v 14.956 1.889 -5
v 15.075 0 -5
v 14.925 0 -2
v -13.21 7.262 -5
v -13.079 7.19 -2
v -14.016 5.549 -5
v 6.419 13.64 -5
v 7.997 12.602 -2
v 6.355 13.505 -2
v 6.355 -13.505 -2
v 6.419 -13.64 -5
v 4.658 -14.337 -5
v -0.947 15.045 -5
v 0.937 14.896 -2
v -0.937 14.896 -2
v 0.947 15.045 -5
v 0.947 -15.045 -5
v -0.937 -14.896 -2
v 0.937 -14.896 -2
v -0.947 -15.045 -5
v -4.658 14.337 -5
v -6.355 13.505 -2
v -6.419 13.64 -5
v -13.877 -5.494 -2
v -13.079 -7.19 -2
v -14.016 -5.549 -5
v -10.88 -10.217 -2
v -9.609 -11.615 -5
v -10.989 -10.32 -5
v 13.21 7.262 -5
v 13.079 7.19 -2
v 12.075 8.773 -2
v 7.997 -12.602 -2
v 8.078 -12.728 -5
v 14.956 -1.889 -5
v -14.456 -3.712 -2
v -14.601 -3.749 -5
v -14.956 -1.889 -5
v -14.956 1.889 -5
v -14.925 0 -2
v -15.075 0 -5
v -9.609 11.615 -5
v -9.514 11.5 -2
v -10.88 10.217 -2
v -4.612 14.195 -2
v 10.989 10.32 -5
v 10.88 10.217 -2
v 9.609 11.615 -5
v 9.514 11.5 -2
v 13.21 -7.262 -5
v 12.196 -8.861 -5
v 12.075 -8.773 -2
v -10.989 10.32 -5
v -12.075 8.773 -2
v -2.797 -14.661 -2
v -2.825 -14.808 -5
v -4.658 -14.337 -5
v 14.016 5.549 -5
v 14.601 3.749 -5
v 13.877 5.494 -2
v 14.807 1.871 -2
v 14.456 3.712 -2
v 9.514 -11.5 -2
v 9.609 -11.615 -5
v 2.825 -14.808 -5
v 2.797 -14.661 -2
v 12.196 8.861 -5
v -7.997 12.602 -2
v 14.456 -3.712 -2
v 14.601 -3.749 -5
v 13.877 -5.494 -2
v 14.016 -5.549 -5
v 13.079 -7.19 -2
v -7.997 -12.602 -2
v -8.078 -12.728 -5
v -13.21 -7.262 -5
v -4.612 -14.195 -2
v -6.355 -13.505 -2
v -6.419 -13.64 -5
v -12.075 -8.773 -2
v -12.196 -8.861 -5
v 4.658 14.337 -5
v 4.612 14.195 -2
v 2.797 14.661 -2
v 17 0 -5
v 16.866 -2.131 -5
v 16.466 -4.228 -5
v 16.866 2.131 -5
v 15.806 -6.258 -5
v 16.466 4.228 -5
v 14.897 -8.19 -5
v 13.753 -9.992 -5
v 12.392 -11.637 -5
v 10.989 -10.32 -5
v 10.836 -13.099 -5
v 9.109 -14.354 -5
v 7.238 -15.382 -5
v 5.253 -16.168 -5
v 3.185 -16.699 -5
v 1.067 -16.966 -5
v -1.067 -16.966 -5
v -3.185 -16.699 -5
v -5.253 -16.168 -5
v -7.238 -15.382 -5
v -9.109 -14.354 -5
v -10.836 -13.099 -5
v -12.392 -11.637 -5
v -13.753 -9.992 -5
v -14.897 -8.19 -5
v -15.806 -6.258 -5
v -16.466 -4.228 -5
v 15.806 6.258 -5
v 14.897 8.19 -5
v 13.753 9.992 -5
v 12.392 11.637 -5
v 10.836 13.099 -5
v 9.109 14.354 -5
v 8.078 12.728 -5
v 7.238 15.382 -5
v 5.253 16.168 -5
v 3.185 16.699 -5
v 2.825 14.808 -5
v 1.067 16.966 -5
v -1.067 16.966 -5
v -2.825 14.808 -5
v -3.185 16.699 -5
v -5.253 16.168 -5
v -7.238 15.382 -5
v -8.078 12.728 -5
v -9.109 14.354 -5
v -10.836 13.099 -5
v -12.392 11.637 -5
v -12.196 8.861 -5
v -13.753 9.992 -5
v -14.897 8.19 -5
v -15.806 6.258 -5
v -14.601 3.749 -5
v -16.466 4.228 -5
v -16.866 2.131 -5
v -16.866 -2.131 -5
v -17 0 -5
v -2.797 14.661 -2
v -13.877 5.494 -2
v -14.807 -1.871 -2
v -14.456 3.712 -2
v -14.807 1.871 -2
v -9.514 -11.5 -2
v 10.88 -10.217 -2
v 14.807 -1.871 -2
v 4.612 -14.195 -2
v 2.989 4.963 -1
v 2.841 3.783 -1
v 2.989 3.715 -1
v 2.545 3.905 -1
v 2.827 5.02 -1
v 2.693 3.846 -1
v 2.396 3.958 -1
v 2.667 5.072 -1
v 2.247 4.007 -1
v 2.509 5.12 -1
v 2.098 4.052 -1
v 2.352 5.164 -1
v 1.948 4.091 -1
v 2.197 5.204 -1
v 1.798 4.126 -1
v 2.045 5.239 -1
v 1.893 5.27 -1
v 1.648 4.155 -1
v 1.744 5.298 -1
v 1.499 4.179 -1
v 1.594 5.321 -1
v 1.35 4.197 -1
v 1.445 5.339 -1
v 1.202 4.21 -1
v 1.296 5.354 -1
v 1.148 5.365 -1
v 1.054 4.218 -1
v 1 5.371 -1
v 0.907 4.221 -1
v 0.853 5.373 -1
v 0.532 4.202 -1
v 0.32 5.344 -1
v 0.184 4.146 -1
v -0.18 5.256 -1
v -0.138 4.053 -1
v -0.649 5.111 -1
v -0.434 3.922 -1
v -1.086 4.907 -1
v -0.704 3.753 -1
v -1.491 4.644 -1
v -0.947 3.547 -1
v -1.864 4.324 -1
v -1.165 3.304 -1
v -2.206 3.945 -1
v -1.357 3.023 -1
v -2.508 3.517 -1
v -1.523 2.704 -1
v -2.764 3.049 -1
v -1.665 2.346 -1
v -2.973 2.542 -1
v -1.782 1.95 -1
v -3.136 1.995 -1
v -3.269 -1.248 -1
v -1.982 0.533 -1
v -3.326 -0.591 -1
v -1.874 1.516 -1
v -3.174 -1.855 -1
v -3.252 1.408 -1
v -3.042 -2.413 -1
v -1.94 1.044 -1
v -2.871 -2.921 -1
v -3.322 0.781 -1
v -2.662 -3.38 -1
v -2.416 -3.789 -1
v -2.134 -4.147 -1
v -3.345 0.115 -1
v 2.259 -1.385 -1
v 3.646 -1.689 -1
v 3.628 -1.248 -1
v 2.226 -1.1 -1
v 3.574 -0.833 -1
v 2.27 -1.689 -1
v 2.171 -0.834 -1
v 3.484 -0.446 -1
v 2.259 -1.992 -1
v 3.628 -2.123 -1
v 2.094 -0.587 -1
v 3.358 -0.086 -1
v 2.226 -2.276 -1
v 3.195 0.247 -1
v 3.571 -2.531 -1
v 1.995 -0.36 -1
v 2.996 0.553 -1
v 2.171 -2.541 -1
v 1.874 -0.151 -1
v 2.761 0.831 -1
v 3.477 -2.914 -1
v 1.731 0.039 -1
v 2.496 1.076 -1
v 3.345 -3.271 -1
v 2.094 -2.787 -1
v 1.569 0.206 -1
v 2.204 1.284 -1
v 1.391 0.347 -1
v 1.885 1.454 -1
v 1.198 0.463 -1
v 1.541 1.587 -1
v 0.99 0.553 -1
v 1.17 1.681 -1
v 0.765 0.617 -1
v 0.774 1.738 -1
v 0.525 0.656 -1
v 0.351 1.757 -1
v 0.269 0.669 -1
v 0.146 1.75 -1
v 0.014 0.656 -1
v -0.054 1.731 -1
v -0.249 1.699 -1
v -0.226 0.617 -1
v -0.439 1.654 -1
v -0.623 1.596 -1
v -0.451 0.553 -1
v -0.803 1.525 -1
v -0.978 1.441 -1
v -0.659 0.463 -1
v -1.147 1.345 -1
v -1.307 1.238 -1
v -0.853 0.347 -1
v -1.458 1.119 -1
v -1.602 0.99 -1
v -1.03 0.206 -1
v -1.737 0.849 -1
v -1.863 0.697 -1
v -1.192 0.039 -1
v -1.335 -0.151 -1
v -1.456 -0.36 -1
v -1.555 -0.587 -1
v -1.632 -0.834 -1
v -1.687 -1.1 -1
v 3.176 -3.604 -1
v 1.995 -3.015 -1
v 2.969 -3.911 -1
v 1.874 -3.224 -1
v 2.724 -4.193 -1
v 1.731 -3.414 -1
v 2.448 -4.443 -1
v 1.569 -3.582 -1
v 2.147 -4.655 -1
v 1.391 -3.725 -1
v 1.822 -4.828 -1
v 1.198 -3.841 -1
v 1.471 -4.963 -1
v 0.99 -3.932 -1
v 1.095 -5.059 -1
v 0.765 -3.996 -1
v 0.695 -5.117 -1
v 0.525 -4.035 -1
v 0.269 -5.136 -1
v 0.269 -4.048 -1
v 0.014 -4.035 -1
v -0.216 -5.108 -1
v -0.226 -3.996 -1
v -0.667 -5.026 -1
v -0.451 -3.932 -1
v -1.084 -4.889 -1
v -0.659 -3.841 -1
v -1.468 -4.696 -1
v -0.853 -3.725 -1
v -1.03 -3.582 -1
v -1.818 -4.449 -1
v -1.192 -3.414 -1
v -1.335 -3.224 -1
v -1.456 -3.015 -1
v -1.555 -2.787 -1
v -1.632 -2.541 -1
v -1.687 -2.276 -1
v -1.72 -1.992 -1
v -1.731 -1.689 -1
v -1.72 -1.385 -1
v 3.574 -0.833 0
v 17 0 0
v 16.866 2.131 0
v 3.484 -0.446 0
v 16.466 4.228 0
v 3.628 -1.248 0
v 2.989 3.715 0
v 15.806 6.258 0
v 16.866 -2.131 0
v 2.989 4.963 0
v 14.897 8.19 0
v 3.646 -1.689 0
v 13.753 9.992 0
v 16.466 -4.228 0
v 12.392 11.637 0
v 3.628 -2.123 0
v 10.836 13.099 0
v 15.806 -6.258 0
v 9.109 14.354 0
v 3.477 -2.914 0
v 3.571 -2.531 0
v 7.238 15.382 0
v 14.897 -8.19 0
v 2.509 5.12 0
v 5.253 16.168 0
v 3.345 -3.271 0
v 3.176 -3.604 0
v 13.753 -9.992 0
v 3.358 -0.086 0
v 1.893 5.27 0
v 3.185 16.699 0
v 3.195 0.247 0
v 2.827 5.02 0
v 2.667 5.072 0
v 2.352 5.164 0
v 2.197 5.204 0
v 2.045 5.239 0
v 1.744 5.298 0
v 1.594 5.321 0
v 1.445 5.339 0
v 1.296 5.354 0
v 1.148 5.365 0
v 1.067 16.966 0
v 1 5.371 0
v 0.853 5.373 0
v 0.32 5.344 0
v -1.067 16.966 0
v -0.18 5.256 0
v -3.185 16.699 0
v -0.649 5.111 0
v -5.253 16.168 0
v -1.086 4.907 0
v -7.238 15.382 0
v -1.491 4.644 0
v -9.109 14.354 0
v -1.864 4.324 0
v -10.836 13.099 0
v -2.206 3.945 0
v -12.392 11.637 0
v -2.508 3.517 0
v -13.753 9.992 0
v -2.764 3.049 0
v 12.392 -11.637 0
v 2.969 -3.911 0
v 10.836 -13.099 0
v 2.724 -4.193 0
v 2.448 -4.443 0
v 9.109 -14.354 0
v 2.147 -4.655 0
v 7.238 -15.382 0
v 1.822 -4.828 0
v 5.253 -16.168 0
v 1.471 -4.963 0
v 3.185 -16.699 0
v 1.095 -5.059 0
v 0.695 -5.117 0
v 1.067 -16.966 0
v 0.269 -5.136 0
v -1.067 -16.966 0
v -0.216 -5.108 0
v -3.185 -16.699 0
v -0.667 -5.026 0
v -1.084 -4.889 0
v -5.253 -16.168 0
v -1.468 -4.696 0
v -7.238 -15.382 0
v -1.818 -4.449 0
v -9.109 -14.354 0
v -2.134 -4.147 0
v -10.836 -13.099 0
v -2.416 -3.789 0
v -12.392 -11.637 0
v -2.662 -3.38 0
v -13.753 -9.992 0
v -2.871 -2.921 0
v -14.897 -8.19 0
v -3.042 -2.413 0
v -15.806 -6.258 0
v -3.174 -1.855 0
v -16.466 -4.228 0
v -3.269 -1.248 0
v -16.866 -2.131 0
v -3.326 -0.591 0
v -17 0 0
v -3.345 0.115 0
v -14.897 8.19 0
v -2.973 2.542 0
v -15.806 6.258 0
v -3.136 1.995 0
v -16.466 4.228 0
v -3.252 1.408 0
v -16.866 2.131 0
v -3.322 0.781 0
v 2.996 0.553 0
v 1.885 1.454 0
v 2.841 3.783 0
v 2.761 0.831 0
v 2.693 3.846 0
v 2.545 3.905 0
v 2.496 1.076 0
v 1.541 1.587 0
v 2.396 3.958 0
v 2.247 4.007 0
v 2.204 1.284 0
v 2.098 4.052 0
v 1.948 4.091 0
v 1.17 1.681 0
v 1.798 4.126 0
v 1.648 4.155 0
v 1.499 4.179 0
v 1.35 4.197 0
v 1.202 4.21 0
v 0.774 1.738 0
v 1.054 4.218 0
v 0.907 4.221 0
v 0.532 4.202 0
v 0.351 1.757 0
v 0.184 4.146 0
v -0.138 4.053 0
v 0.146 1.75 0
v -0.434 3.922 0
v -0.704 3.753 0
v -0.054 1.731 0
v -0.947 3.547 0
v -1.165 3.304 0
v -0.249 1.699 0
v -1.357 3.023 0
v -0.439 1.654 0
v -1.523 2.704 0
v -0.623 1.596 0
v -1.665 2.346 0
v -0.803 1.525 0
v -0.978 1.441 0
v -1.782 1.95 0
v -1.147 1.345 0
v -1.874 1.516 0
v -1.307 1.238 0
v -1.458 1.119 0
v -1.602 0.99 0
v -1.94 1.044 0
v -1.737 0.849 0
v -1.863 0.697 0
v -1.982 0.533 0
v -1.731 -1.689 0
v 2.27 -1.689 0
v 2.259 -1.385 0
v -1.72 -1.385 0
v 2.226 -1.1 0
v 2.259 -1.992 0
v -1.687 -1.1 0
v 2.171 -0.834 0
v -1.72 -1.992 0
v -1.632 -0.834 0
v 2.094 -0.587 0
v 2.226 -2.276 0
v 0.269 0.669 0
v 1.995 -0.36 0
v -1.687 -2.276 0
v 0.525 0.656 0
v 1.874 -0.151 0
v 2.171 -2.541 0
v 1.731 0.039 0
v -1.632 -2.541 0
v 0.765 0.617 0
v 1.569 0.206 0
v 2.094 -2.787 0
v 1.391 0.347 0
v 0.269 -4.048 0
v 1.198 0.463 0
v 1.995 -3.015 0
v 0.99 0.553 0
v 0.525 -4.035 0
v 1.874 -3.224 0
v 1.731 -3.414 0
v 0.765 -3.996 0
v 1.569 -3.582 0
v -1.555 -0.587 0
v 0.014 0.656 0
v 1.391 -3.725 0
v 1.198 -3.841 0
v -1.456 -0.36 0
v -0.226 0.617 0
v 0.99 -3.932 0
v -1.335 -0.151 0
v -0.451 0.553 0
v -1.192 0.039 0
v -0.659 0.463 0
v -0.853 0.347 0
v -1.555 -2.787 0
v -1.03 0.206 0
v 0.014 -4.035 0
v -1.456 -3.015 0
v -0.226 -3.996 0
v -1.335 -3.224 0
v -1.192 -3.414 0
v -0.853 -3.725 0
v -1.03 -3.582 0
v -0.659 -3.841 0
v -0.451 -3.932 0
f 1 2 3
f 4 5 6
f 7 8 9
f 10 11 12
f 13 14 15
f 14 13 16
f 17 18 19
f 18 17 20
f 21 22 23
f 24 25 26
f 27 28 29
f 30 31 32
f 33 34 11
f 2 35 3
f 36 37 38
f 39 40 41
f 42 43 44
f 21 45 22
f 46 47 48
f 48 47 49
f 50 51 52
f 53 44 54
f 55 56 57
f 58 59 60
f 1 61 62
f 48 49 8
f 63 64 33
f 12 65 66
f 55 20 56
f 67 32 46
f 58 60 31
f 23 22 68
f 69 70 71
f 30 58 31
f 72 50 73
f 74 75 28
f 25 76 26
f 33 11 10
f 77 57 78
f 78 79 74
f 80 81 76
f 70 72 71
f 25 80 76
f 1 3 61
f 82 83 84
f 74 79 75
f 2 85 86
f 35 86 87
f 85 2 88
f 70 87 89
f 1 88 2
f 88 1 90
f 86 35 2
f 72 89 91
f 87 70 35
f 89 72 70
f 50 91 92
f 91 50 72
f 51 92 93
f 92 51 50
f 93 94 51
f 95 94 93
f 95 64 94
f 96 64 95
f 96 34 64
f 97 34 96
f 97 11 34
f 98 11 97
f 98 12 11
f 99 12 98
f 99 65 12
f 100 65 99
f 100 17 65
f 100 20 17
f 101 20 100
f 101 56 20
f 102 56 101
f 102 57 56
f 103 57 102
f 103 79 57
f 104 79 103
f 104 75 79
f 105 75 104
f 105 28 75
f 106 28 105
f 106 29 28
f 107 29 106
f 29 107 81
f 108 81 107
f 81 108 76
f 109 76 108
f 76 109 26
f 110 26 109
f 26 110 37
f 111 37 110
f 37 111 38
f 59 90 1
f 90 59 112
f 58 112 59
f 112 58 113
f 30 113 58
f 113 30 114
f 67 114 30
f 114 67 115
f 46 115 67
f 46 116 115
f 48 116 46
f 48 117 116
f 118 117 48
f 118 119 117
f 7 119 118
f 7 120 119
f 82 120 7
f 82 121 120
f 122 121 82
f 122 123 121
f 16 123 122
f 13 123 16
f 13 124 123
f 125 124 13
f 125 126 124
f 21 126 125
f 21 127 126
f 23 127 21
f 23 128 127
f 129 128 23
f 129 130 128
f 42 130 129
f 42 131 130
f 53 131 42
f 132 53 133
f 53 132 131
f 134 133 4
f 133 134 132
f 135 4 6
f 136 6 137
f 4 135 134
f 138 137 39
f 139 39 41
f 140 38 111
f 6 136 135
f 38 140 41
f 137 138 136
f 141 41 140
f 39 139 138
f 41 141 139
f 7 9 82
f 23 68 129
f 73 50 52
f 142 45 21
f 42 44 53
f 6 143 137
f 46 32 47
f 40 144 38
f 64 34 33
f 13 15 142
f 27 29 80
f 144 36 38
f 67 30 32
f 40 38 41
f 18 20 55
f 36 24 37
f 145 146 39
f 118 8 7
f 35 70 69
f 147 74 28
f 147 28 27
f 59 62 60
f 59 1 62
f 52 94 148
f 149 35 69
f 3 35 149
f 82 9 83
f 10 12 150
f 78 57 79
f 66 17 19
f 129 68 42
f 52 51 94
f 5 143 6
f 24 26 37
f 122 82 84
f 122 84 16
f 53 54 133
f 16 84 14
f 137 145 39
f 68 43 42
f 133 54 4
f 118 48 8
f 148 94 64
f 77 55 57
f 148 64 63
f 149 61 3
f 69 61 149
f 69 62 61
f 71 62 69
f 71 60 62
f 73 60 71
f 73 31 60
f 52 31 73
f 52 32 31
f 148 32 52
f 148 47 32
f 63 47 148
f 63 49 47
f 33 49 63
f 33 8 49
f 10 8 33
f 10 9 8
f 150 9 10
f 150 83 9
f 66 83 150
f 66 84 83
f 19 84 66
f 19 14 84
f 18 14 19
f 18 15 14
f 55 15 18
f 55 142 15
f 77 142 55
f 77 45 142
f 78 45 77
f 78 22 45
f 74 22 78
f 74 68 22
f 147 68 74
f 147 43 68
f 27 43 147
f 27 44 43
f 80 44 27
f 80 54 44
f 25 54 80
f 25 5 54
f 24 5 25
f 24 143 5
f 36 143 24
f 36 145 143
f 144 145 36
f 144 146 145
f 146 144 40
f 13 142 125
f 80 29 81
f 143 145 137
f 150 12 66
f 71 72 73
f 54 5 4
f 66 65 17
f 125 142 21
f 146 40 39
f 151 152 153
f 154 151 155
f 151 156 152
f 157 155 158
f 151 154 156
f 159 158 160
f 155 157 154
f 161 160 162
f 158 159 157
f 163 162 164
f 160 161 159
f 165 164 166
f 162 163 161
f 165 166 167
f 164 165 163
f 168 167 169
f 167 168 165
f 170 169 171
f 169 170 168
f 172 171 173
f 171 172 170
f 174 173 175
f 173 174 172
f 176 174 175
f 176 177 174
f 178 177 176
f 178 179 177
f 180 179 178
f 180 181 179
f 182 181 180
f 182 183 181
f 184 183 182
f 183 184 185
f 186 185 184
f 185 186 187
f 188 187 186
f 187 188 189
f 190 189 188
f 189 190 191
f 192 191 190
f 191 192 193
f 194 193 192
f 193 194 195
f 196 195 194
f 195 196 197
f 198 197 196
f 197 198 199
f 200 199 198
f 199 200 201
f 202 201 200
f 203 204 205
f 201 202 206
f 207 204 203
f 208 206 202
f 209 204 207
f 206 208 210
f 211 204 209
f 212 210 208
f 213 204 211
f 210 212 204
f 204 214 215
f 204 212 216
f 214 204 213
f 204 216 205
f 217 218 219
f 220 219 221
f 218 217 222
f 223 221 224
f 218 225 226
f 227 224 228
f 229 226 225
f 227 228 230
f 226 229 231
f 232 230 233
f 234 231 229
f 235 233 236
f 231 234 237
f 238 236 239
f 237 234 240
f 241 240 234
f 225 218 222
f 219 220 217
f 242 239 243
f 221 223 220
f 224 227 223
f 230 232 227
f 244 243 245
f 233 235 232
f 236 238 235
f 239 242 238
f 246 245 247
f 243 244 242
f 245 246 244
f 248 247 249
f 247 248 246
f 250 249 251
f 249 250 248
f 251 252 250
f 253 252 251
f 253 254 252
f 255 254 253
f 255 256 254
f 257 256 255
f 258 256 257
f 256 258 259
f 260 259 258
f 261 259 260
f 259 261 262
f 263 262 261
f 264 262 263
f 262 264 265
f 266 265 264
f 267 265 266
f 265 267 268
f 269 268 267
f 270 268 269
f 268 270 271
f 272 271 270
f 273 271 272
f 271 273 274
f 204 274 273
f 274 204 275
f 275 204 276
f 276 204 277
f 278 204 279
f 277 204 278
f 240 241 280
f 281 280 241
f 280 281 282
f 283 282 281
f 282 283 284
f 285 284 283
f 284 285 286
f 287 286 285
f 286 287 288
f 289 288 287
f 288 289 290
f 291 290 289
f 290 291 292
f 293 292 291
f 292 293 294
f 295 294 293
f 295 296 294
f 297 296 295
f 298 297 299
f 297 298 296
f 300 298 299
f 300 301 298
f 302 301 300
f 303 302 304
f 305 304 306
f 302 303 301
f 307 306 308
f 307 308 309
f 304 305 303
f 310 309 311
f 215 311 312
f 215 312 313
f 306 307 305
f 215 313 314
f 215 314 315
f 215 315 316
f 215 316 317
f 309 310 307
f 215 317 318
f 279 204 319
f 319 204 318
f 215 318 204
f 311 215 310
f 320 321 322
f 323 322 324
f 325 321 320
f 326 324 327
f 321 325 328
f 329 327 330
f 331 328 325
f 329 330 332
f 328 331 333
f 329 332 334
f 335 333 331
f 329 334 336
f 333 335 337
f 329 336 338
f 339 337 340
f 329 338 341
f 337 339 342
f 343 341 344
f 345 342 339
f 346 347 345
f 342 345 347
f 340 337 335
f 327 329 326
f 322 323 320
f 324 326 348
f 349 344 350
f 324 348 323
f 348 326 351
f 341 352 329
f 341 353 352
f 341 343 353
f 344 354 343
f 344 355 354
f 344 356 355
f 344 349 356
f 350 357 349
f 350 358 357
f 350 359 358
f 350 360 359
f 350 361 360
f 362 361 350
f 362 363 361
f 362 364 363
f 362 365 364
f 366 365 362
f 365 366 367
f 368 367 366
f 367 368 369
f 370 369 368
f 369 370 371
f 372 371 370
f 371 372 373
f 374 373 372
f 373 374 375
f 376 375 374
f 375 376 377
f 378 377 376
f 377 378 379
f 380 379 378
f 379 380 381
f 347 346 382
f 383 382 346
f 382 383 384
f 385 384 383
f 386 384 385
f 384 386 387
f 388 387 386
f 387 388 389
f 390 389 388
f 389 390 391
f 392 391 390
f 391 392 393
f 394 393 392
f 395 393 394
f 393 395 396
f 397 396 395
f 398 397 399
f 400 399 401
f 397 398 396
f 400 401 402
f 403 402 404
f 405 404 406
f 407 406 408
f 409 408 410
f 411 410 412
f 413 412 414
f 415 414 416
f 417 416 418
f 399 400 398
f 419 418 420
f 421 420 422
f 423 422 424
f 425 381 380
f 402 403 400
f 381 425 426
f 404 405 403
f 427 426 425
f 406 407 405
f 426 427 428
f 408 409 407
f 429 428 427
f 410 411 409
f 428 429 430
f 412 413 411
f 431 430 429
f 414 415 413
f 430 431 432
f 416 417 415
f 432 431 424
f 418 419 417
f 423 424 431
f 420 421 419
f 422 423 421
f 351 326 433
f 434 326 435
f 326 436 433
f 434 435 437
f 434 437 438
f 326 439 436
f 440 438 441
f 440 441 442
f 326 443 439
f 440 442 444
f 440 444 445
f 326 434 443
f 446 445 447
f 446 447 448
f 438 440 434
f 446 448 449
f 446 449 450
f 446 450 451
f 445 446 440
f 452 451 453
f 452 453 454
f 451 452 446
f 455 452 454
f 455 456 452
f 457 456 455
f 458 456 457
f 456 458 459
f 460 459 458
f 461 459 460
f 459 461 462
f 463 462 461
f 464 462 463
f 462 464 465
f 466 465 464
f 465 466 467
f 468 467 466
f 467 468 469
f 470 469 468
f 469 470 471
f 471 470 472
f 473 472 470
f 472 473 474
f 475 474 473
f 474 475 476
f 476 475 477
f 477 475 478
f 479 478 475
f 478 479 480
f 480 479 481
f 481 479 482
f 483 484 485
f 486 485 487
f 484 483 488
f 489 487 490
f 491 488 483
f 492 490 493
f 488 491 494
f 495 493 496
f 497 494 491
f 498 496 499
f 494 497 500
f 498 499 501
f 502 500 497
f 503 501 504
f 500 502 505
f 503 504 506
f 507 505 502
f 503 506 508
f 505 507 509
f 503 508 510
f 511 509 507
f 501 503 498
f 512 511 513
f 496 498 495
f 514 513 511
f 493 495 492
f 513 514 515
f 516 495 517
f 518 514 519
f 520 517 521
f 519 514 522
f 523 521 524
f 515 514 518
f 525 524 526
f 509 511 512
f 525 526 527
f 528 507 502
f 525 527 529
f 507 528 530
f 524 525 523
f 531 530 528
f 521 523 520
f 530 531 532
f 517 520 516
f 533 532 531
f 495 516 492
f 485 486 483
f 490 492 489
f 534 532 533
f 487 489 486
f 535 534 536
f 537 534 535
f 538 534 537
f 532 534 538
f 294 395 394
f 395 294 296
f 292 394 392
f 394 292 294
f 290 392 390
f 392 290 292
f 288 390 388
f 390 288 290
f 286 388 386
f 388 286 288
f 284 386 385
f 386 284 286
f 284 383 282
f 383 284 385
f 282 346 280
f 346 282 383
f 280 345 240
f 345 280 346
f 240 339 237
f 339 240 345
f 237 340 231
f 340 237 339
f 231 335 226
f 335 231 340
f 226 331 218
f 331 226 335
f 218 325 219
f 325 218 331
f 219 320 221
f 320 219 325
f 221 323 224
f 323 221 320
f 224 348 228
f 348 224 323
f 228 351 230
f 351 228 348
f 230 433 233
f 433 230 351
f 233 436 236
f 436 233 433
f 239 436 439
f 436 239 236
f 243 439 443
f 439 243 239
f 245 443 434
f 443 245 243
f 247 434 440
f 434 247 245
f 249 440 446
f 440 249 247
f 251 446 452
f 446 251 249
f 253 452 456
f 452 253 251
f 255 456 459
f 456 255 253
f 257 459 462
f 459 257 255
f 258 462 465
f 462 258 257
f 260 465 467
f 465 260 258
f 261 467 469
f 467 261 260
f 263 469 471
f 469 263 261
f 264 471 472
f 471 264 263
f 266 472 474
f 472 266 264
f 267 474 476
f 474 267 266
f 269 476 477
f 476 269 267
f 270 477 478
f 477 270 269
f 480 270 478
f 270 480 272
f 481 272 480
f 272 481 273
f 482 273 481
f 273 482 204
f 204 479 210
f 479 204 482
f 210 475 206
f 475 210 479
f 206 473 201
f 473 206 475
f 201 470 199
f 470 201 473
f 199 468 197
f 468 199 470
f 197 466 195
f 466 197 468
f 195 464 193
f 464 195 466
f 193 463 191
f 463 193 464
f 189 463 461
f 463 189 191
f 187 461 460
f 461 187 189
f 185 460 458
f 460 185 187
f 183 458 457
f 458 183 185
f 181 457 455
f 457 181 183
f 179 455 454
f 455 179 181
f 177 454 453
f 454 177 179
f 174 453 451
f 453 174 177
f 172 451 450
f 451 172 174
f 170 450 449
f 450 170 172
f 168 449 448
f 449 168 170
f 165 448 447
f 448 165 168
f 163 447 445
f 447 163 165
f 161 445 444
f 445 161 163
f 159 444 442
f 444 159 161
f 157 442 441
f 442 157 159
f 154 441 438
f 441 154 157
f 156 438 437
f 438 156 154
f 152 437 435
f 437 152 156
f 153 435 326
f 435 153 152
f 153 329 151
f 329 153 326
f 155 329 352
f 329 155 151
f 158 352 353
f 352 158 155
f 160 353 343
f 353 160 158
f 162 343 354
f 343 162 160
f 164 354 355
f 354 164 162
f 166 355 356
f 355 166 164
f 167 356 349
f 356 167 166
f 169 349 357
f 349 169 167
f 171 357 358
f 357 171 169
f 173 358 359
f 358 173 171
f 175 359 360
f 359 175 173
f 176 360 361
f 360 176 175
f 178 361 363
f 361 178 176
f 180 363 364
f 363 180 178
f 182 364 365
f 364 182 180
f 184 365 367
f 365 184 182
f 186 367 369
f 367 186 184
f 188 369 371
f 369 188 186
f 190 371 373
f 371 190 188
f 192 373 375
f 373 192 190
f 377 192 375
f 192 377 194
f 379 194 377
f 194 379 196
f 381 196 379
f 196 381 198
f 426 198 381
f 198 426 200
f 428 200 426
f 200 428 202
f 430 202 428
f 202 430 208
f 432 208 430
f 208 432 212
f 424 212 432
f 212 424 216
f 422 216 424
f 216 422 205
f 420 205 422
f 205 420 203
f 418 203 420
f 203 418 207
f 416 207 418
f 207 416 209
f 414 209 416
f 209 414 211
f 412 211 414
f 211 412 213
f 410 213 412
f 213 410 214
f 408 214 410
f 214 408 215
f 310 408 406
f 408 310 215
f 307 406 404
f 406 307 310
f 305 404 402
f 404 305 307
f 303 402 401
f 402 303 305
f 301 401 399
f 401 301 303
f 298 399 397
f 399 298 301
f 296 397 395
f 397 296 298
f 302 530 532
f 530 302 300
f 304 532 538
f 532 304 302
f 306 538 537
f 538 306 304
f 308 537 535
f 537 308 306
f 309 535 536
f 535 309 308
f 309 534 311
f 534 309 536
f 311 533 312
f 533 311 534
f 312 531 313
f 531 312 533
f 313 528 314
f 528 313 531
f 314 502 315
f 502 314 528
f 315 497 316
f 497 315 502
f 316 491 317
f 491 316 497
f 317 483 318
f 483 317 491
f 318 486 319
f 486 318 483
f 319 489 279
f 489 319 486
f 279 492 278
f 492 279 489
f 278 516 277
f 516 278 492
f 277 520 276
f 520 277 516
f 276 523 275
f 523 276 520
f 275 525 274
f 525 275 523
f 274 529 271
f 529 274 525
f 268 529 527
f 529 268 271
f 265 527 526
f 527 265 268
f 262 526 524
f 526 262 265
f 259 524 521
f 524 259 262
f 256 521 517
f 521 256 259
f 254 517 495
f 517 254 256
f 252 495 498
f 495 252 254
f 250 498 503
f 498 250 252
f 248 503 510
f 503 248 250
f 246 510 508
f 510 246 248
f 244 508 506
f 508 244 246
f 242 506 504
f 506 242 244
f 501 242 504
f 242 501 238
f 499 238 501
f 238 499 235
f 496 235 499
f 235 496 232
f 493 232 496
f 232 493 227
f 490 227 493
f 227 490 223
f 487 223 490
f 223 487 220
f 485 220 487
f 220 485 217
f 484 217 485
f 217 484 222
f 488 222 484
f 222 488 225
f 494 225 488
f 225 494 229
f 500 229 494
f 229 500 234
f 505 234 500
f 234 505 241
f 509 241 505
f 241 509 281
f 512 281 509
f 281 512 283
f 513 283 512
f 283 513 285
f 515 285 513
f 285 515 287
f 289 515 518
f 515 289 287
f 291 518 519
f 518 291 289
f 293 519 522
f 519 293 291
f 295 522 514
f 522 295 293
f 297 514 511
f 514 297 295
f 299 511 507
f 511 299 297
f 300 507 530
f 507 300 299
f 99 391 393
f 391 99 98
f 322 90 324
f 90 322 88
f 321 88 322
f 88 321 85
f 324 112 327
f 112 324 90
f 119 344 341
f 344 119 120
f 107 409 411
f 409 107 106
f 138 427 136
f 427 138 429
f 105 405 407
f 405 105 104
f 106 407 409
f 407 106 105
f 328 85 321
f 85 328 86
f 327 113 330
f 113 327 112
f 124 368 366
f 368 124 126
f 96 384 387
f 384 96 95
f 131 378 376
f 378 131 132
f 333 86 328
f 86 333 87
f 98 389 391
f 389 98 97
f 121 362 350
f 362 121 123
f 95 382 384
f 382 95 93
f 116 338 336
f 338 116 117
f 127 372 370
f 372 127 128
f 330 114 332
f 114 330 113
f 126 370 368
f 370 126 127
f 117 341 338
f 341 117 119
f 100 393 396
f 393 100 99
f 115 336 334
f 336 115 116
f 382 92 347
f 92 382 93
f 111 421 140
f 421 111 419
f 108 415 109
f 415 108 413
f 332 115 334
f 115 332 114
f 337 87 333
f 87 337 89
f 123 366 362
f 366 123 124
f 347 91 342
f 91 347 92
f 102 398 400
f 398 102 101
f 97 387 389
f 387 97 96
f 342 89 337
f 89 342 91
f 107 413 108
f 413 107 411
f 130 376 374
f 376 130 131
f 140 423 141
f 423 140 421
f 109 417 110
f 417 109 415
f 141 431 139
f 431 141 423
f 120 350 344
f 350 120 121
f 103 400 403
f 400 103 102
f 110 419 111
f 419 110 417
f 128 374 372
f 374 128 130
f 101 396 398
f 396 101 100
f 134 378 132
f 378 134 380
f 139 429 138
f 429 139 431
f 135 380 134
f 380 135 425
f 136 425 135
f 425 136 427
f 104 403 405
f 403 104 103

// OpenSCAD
$fn = 50;


difference() {
	union() {
		translate(v = [0, 0, -5.0000000000]) {
			cylinder(h = 5, r = 17.0000000000);
		}
	}
	union() {
		#translate(v = [0, 0, -5.0000000000]) {
			cylinder(h = 3, r1 = 15.0750000000, r2 = 14.9250000000);
		}
		translate(v = [0, 0, -1]) {
			linear_extrude(height = 1) {
				text(font = "Impact", halign = "center", size = 10, text = "6", valign = "center");
			}
		}
	}
}
